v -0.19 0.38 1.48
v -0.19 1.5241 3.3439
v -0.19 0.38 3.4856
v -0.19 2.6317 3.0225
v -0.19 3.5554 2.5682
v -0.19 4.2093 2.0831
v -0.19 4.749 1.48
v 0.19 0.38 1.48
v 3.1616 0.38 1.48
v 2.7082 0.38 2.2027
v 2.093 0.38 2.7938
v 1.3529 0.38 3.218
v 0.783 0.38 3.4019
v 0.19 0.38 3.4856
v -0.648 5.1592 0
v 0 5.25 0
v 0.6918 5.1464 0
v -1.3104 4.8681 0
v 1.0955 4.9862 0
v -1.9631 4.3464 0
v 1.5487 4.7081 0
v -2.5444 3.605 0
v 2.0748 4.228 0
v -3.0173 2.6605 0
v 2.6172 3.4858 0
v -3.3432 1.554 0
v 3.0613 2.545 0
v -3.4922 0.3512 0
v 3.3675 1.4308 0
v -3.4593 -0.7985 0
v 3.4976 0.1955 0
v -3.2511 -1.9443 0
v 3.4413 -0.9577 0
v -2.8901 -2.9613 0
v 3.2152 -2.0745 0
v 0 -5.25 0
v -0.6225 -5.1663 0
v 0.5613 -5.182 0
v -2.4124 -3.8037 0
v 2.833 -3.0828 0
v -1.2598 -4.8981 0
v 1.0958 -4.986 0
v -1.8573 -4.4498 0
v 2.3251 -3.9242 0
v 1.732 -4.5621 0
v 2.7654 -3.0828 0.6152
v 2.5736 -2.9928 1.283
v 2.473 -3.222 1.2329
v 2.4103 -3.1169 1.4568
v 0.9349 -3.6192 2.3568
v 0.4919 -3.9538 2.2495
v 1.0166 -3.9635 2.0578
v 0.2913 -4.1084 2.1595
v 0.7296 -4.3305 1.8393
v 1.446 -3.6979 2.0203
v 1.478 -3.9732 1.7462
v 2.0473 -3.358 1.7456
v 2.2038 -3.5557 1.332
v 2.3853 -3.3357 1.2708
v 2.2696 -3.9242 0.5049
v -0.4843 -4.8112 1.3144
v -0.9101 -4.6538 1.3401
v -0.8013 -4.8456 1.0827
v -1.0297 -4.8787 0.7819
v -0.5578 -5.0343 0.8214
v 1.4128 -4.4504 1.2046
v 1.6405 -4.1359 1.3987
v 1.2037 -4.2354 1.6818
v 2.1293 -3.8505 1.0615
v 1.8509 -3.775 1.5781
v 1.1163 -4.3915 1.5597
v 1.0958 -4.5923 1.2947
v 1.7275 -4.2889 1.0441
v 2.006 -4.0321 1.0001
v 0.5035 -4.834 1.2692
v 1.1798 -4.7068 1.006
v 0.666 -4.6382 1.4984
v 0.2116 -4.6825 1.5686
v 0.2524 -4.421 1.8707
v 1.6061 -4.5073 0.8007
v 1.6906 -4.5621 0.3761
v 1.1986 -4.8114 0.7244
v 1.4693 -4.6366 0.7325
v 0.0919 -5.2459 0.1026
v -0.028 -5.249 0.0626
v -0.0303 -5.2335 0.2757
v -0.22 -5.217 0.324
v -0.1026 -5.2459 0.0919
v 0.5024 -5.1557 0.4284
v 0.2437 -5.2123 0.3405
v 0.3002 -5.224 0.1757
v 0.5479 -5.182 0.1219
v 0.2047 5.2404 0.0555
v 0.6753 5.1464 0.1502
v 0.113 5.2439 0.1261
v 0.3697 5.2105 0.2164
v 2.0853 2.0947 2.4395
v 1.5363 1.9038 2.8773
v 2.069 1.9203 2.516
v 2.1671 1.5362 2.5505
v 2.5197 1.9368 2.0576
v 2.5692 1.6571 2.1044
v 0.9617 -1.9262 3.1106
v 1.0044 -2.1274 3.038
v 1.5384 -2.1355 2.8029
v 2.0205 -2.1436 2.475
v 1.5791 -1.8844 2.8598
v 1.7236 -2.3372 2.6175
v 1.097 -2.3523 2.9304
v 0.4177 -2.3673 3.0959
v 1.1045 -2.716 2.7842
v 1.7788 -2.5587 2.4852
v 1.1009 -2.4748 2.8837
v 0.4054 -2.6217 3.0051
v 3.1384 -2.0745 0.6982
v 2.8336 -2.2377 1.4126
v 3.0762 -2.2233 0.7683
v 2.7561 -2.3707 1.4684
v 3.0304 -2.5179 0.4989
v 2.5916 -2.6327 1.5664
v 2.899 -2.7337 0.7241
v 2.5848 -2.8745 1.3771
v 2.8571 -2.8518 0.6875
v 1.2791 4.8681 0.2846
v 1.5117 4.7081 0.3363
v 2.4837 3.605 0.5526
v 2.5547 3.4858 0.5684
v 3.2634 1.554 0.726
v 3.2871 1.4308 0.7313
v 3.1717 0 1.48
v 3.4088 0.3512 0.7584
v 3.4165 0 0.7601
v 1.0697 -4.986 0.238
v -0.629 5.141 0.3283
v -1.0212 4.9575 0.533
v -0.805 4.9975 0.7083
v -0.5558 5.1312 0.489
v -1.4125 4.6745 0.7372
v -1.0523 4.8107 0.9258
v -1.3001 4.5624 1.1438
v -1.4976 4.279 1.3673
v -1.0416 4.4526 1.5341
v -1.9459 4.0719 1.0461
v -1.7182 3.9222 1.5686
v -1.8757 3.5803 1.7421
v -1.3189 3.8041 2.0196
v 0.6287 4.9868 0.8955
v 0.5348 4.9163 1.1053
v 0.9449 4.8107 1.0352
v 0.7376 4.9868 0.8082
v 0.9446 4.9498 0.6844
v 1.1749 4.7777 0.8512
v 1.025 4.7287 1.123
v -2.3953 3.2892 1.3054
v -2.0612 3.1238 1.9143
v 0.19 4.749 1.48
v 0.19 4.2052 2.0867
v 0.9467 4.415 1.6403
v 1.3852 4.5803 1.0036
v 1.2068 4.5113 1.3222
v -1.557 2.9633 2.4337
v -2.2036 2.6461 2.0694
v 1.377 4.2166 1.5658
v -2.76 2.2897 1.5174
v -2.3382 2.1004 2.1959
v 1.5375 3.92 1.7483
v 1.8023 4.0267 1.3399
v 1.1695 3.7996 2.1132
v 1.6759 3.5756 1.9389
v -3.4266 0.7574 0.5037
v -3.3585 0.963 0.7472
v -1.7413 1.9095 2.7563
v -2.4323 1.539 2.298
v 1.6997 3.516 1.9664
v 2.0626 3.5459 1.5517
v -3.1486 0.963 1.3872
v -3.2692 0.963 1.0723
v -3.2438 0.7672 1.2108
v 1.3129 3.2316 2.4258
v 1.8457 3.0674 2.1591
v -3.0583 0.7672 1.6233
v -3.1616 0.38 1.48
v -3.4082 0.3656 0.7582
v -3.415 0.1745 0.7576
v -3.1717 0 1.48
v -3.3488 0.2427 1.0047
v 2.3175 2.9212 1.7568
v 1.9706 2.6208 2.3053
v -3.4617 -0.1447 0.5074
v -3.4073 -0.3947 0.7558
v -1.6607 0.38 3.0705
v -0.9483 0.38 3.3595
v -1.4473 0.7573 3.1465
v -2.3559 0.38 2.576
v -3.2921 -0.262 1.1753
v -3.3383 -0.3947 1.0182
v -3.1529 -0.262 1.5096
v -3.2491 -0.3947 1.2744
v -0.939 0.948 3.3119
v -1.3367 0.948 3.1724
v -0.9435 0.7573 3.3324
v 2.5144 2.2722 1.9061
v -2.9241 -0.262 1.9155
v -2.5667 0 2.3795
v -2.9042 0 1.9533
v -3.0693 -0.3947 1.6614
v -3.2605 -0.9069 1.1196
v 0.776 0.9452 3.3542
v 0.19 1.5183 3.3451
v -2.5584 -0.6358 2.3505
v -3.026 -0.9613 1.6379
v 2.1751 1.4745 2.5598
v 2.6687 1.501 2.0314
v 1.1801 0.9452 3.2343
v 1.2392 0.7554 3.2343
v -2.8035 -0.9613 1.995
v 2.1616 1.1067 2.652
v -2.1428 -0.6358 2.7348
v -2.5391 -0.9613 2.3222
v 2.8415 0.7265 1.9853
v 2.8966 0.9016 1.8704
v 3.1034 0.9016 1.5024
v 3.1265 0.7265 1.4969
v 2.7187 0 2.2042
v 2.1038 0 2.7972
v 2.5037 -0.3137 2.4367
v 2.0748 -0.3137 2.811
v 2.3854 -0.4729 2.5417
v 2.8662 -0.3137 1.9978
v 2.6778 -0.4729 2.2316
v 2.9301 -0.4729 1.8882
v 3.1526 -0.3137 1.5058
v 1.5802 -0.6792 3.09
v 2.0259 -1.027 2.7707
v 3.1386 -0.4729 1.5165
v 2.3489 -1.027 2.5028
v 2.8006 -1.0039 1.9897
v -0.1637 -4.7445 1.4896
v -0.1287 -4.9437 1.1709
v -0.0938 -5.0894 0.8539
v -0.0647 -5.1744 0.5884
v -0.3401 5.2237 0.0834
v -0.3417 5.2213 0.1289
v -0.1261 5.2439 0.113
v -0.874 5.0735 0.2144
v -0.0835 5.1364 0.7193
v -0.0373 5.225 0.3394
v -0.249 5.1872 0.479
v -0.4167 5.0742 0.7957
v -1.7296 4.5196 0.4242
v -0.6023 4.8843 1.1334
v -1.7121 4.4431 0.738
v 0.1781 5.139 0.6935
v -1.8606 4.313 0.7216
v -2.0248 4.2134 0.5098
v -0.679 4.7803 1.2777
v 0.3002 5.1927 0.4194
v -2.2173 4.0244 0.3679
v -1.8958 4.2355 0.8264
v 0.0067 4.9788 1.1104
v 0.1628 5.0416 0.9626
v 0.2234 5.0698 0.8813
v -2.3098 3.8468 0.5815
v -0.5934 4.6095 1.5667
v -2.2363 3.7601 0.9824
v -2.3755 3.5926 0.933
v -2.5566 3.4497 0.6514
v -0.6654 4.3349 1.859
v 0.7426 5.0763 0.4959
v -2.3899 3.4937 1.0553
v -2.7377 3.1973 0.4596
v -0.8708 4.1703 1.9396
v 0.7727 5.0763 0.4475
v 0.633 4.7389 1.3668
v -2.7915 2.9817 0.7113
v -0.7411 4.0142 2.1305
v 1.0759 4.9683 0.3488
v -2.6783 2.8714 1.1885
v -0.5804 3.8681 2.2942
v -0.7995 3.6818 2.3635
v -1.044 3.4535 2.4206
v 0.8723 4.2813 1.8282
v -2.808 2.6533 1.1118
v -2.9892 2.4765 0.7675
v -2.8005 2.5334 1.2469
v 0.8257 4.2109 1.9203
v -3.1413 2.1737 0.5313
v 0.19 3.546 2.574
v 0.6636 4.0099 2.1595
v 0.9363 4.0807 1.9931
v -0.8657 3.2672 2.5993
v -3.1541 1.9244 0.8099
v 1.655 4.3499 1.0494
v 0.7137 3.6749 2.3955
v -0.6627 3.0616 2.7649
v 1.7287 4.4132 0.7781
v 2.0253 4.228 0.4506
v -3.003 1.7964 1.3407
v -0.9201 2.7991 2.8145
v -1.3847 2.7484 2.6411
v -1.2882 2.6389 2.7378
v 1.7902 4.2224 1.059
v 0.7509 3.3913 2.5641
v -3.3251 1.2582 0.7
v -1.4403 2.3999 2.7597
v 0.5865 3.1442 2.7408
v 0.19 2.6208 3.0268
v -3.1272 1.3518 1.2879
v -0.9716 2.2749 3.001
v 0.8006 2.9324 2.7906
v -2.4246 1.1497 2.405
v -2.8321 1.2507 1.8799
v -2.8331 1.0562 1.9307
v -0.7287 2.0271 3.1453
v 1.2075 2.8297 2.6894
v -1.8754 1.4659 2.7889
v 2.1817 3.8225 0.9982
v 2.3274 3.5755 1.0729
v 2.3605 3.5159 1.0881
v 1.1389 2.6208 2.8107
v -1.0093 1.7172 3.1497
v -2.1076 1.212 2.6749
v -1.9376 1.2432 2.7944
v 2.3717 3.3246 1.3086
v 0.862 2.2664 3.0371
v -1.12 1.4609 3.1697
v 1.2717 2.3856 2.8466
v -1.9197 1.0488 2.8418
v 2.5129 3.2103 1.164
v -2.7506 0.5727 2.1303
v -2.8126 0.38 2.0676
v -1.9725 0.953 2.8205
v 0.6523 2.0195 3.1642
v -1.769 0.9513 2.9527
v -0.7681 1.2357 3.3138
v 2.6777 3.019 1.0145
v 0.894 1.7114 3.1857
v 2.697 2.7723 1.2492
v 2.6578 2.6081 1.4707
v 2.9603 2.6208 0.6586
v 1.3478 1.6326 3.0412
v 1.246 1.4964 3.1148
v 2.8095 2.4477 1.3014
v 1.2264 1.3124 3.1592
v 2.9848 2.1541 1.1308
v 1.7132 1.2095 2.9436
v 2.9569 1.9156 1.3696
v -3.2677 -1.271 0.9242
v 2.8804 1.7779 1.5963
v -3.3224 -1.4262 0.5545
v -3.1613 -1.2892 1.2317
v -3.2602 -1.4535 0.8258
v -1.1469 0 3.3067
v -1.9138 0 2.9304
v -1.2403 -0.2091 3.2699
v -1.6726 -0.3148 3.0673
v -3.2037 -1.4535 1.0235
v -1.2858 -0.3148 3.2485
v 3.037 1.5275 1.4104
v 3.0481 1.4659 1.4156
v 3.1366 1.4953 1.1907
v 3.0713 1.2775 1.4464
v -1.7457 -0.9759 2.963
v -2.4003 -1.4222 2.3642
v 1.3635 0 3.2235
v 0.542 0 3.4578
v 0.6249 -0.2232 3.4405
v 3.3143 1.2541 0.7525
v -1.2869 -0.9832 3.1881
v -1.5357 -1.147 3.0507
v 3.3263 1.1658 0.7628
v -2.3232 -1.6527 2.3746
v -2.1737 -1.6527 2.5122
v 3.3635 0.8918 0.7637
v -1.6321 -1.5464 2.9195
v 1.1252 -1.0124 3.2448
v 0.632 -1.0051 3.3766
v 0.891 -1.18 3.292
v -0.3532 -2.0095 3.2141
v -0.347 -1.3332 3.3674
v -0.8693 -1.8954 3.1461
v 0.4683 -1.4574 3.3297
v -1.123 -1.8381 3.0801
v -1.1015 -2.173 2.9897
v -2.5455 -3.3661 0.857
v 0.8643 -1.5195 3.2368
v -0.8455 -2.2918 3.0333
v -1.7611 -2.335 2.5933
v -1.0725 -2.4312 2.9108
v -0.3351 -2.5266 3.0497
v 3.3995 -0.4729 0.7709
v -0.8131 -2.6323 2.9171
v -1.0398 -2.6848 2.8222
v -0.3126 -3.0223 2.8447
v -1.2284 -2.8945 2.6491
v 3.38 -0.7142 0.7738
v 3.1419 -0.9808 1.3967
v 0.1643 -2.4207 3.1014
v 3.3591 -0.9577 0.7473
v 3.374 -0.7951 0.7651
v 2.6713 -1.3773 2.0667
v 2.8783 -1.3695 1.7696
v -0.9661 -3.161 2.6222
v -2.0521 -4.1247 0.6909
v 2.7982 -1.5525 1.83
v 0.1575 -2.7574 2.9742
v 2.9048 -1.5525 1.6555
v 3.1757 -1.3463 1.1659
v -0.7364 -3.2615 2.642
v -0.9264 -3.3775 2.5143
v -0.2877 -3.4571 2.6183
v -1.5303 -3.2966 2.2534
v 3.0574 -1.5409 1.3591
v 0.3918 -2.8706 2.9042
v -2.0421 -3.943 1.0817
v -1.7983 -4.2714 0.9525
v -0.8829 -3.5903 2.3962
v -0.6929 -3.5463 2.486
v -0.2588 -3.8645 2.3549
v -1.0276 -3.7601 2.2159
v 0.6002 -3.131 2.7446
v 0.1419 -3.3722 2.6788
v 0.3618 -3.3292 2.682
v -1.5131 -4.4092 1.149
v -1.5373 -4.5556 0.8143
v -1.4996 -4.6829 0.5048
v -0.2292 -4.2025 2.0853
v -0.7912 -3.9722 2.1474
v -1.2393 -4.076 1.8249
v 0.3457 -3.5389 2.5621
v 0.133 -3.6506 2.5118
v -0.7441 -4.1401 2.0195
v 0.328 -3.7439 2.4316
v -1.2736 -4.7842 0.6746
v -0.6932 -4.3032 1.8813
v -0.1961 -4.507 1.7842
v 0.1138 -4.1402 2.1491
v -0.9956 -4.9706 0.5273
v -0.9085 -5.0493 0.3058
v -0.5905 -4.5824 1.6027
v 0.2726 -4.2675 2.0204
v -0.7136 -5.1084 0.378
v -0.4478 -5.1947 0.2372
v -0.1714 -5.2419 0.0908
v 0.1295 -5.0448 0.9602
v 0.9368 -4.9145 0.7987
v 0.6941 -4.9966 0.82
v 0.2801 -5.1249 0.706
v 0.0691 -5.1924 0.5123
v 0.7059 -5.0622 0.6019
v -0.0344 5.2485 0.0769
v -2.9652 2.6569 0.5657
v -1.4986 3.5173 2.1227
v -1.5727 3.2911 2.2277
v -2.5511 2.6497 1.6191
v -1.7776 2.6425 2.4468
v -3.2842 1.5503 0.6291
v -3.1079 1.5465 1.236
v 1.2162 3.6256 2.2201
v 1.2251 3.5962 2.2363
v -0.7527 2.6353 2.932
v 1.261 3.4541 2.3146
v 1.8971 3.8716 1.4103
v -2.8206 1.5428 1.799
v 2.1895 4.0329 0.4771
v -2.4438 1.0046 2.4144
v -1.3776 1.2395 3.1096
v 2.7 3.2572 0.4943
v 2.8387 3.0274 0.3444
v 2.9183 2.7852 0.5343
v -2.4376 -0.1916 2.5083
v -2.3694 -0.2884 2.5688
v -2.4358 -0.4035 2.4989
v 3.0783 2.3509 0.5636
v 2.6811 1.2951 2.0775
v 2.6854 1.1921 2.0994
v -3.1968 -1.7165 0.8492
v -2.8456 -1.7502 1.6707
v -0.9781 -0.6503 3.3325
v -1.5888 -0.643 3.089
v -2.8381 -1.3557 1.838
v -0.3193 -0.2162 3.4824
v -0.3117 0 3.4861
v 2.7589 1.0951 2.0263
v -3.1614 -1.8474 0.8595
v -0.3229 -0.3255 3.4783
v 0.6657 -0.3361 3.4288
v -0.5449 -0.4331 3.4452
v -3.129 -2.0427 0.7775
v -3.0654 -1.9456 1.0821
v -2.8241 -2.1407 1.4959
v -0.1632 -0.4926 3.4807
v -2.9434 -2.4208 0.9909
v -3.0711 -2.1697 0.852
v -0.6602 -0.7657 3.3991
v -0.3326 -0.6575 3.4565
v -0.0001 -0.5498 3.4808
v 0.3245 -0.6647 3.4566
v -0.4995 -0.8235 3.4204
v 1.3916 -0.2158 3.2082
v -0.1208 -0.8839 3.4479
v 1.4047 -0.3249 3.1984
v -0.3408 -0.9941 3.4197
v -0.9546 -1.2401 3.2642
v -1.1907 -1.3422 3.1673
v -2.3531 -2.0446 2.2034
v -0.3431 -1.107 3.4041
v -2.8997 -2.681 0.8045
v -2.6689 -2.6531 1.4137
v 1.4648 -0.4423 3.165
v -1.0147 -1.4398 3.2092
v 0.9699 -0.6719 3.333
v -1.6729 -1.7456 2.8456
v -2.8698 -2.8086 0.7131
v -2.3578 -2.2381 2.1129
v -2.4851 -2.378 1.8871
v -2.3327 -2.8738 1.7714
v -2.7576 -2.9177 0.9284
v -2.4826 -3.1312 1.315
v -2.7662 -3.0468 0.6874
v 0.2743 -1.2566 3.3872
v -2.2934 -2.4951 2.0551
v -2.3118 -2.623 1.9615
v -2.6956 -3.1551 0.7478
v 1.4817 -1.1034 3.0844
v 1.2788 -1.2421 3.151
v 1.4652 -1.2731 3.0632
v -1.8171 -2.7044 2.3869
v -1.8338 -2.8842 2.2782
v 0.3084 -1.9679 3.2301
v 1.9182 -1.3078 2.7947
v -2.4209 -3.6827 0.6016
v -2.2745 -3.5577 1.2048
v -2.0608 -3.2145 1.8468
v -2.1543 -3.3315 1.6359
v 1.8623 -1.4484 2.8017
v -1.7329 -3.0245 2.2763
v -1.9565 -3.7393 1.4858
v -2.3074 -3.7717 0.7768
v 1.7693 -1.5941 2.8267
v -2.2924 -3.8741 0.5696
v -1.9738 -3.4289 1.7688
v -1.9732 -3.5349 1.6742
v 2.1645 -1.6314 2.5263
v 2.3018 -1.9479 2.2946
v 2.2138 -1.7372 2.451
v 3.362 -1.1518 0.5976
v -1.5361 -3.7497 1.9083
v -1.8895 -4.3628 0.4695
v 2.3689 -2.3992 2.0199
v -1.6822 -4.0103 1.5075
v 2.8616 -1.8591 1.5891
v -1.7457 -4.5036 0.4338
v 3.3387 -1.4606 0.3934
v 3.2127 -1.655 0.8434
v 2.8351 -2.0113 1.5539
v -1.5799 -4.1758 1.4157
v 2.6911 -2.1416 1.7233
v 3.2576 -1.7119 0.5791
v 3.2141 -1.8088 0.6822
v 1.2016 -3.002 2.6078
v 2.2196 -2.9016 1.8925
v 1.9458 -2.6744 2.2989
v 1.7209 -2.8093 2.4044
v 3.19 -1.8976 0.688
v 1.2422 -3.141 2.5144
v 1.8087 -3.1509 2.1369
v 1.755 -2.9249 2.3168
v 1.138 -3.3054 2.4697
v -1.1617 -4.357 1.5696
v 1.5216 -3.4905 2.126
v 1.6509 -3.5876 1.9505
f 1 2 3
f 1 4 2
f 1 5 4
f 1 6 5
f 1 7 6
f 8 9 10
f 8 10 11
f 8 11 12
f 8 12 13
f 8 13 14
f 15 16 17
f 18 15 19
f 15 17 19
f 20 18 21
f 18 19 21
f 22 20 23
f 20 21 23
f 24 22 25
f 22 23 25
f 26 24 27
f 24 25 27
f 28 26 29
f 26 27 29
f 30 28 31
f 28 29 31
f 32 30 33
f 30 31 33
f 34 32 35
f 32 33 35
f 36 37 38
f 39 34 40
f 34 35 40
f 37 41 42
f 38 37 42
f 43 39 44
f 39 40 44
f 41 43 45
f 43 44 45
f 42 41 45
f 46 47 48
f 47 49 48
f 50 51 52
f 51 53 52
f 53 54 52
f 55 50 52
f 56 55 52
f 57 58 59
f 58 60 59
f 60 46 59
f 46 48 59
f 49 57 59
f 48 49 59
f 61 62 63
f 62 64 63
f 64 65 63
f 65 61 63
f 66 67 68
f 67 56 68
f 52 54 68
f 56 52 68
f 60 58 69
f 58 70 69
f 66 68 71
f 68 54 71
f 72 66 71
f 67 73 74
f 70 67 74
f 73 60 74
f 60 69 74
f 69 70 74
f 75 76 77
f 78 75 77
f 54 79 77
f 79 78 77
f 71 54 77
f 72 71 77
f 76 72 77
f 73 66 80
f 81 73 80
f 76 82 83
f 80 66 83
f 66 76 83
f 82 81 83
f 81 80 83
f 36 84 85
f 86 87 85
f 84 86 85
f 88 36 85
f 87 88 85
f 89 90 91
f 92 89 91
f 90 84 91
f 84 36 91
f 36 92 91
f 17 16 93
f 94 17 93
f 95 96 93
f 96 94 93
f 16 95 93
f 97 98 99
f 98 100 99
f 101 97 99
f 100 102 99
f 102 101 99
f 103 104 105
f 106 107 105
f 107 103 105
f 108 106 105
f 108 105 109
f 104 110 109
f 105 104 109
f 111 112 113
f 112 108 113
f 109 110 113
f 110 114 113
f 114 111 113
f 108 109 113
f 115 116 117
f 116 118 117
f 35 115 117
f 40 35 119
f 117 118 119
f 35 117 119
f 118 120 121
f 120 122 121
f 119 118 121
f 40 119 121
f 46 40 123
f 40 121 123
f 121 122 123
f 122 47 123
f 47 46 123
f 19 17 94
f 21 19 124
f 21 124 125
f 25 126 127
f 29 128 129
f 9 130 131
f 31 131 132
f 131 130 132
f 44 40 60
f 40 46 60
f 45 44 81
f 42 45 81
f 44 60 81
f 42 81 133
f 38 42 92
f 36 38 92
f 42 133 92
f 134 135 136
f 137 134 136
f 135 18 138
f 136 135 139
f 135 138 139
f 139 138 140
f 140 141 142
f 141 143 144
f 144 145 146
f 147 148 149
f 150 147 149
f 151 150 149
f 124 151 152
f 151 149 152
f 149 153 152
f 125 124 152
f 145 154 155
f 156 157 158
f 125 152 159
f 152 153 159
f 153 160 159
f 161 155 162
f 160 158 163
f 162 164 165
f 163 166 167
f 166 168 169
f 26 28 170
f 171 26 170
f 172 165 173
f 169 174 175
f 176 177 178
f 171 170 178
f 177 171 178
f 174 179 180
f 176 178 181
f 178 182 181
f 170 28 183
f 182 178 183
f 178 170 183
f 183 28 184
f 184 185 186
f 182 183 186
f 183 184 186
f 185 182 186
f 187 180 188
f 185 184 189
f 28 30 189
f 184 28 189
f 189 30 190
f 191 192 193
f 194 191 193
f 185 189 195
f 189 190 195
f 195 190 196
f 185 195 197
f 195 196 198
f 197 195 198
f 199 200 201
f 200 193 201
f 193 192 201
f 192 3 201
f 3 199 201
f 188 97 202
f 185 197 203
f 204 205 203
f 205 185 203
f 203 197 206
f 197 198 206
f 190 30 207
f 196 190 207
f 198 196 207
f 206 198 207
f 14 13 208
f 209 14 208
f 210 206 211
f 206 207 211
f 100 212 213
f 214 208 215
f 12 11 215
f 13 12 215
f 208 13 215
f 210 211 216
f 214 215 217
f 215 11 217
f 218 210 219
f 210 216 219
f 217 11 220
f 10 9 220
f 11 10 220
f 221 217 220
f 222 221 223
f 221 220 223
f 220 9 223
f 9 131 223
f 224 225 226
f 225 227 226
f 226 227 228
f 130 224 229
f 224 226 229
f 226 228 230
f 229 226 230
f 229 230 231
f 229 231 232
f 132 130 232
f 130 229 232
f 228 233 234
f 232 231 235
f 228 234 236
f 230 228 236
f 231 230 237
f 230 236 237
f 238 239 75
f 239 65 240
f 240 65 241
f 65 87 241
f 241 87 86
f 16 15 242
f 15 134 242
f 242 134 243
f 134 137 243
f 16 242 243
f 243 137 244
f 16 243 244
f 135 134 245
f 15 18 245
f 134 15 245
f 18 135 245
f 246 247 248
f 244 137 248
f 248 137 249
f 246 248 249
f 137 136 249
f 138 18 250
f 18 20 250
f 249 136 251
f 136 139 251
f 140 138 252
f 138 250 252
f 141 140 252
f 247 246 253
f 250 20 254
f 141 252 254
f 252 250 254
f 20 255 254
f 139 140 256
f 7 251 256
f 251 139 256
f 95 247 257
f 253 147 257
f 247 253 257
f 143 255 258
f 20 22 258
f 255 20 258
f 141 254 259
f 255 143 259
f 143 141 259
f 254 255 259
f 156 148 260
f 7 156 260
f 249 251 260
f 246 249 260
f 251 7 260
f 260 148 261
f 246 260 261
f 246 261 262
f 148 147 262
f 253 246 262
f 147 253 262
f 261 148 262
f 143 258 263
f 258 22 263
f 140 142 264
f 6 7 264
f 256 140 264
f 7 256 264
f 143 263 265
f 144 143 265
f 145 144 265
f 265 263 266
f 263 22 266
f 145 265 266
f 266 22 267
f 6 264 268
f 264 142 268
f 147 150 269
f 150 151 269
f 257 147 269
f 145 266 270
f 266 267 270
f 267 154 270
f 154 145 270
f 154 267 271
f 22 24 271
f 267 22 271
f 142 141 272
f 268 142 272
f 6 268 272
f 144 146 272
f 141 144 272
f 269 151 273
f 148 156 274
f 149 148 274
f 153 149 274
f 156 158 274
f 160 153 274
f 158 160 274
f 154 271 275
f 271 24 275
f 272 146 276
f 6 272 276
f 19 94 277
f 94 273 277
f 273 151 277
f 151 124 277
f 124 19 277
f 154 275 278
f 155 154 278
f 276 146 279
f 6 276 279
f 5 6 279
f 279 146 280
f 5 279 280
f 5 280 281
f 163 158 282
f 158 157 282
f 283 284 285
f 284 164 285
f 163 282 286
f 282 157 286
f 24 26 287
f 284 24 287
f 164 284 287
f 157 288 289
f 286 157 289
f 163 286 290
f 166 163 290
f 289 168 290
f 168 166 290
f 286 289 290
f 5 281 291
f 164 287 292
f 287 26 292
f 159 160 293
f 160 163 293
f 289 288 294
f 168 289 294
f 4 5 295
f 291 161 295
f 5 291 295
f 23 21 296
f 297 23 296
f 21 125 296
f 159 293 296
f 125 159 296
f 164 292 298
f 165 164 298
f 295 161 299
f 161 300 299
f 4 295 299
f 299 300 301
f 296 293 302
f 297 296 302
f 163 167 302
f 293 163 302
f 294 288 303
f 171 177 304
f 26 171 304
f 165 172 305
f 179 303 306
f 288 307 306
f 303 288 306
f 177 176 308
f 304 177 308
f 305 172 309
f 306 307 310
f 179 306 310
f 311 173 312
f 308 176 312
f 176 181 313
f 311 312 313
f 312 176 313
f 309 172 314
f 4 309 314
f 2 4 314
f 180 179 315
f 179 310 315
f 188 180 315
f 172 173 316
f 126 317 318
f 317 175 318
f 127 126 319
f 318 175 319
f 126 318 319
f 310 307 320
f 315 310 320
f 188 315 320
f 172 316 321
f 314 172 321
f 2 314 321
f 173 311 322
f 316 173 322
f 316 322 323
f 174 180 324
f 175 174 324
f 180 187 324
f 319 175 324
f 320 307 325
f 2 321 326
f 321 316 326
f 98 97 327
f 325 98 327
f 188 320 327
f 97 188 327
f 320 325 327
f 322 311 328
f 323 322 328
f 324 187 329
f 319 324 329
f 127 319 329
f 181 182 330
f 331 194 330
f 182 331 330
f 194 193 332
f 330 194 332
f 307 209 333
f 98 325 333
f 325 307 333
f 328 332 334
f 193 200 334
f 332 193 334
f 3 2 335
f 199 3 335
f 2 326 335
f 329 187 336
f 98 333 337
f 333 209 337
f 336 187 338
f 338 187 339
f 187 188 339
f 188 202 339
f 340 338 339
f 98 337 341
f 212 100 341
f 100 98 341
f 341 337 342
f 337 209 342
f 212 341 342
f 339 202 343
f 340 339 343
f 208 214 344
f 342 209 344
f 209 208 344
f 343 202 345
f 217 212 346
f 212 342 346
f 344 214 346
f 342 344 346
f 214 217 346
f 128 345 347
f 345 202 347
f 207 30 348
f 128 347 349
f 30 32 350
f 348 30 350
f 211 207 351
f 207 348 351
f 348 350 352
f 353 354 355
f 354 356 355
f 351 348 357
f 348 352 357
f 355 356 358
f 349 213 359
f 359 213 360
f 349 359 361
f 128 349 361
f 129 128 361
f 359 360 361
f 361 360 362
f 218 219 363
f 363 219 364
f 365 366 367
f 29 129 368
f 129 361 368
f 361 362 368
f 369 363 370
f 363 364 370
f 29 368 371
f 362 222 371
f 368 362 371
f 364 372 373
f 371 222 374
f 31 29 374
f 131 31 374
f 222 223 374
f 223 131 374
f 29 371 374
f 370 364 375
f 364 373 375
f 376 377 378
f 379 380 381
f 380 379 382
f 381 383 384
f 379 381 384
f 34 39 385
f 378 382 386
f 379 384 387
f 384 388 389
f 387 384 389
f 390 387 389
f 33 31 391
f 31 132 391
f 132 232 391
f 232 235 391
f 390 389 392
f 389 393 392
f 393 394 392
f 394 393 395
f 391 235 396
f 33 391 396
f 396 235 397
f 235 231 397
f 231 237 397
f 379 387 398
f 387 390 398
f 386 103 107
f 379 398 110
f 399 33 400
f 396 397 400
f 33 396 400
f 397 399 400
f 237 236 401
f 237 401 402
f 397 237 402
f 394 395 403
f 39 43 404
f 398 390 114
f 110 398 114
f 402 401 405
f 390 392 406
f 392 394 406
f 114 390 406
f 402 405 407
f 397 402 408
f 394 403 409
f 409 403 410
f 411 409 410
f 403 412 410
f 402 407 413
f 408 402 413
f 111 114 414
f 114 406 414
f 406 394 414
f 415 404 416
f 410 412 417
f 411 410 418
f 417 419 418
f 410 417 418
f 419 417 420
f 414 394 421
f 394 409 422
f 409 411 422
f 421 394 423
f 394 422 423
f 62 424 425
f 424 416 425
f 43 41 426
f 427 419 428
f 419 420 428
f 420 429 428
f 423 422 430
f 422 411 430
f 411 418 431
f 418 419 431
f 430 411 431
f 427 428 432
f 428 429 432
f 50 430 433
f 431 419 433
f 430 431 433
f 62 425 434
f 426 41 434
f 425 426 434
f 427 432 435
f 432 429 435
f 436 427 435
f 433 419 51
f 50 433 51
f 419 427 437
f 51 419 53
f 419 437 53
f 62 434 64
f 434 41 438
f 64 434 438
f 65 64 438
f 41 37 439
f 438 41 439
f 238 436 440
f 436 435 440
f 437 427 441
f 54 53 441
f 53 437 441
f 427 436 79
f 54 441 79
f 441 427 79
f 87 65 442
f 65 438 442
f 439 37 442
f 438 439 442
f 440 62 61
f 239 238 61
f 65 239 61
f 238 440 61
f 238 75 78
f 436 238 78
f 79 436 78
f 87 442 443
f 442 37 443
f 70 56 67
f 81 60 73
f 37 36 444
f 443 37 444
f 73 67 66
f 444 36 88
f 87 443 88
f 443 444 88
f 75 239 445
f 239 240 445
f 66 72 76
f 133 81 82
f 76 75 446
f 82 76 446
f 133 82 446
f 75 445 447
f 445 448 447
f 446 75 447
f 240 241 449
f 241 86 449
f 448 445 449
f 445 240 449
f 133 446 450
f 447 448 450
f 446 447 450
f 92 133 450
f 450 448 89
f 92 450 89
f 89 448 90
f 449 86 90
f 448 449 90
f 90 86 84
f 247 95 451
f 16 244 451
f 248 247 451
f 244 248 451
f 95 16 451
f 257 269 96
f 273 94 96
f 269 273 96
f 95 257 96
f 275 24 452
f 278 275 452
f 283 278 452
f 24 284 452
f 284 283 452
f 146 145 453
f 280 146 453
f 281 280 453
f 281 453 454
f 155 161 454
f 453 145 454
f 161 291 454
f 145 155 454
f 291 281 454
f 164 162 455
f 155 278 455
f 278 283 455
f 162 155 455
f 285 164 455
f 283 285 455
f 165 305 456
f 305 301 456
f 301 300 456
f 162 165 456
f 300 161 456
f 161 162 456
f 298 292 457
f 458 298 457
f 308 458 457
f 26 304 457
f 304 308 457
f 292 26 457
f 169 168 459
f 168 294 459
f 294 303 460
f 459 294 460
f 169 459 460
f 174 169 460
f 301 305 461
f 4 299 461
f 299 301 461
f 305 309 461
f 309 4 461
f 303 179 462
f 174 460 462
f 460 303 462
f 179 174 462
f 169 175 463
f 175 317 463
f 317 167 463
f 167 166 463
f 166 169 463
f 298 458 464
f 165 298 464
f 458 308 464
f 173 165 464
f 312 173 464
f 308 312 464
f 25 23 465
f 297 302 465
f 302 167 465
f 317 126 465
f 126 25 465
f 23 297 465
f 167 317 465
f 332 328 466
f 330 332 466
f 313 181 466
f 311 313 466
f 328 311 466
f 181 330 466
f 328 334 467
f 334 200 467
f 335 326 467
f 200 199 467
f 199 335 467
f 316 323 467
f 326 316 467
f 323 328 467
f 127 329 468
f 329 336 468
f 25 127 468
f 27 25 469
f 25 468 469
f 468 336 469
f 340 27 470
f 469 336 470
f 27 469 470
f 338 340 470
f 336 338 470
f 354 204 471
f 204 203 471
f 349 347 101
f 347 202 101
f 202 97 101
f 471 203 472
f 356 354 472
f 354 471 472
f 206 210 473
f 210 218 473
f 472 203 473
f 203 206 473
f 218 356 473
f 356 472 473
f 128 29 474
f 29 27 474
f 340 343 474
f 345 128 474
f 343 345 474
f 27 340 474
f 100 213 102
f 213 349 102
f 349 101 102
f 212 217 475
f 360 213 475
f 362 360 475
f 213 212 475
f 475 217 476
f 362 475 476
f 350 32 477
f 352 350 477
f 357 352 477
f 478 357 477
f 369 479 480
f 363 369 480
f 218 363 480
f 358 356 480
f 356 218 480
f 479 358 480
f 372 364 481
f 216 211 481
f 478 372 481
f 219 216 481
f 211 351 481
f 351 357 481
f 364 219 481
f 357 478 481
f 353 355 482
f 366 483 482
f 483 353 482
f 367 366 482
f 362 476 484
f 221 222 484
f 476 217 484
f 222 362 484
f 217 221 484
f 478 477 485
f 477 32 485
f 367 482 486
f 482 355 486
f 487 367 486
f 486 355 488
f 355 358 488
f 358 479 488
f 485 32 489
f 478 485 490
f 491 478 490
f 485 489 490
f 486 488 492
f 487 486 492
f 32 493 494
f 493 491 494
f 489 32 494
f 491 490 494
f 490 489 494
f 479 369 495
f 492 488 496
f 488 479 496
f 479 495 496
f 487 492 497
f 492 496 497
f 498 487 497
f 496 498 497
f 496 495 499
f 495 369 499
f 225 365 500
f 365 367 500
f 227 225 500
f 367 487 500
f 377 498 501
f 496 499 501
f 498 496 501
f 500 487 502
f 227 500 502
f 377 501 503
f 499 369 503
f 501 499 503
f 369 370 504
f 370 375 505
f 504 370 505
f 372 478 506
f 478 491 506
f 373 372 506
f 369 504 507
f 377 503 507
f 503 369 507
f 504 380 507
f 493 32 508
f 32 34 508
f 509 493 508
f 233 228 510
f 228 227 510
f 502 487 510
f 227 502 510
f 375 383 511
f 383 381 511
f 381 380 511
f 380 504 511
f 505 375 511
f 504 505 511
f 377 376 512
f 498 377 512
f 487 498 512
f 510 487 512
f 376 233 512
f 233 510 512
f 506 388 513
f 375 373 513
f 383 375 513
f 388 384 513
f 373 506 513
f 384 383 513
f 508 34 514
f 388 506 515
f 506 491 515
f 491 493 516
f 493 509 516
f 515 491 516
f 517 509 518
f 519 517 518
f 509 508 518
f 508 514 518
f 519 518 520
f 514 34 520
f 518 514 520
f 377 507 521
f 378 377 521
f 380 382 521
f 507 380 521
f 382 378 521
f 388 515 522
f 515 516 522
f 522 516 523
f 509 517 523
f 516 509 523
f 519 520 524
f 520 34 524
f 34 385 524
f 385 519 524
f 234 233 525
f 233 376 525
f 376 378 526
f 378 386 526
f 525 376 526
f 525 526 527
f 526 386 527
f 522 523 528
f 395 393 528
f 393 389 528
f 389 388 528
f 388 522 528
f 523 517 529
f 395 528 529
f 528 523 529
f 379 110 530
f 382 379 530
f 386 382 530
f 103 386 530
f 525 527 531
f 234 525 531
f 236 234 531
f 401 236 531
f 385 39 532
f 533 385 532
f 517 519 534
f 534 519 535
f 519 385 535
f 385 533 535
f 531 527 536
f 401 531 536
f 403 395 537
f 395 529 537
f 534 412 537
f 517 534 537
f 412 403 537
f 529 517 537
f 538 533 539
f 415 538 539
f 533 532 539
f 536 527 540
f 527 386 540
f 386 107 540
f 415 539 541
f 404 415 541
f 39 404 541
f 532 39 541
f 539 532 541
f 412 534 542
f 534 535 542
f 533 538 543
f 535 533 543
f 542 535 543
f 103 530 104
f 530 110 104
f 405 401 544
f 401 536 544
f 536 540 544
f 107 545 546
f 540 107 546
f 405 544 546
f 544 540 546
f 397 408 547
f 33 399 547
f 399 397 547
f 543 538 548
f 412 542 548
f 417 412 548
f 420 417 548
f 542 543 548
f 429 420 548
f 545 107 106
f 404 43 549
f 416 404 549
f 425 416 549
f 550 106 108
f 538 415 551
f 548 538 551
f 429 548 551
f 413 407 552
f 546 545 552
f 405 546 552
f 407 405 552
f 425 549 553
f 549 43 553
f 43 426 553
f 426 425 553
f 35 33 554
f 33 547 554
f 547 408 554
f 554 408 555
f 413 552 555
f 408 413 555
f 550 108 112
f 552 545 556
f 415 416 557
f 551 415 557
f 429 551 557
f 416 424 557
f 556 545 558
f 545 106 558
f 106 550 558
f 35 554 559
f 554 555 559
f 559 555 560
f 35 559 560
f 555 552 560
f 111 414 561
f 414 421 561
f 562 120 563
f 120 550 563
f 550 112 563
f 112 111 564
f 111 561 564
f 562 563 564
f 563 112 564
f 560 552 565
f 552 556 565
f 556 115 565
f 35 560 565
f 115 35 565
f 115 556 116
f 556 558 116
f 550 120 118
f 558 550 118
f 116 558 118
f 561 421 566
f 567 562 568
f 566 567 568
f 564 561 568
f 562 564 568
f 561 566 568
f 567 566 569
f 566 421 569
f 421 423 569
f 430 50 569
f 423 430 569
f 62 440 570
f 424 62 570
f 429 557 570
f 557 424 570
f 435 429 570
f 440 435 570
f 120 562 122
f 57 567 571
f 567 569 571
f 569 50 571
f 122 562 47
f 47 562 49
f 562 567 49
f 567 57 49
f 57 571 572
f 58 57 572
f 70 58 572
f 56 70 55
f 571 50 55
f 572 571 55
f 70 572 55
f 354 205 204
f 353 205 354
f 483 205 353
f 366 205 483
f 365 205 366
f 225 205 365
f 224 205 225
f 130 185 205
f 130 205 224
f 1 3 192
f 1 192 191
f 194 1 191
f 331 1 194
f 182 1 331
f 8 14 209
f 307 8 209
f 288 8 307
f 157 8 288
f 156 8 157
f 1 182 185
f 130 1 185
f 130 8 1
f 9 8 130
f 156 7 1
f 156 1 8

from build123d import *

# Parameters (mm, degrees)
F3_DEPTH      = 25
F3_DEPTH_BACK = 25
F5_START      = 1.48
F5_DEPTH      = 10.02


with BuildPart() as f1:
    # F0 (on Top) → F1 (revolve)
    with BuildSketch(Plane.XY):
        with BuildLine():
            Line((0, 1.8567474326), (0, 5.25))
            add(Edge.make_bspline(
                [(0, 5.25), (-3.5, 5.25), (-3.5, 0), (-3.5, -5.25), (0, -5.25)],
                knots=[0, 0, 0, 1.5707963268, 1.5707963268, 3.1415926536, 3.1415926536, 3.1415926536], degree=2, weights=[1, 0.7071067812, 1, 0.7071067812, 1]))
            Line((0, -5.25), (0, 0))
            Line((0, 0), (0, 1.8567474326))
        make_face()
    revolve(axis=Axis((0, 3.5533737163, 0), (0, 1, 0)))

    # F2 (on Right) → F3 (cut, two sides)
    with BuildSketch(Plane.YZ) as f3_sk:
        Polygon((6.3744364306, 0), (0, 0), (-6.297763437, 0), (-6.297763437, -3.5955796484), (6.3744364306, -3.5955796484), align=None)
    extrude(amount=-F3_DEPTH, mode=Mode.SUBTRACT)
    extrude(f3_sk.sketch, amount=F3_DEPTH_BACK, mode=Mode.SUBTRACT)

    # F4 (on Top) → F5 (cut)
    with BuildSketch(Plane.XY.offset(F5_START)):
        Polygon((-4.4482909143, 0), (0, 0), (4.5133754611, 0), (4.5133754611, 0.38), (0.1900000061, 0.38), (0.1900000061, 5.200644955), (0.1900000061, 5.4544974118), (-0.19, 5.4544974118), (-0.19, 5.200644955), (-0.19, 0.38), (-4.4482909143, 0.38), align=None)
    extrude(amount=F5_DEPTH, mode=Mode.SUBTRACT)


solid = f1.part
